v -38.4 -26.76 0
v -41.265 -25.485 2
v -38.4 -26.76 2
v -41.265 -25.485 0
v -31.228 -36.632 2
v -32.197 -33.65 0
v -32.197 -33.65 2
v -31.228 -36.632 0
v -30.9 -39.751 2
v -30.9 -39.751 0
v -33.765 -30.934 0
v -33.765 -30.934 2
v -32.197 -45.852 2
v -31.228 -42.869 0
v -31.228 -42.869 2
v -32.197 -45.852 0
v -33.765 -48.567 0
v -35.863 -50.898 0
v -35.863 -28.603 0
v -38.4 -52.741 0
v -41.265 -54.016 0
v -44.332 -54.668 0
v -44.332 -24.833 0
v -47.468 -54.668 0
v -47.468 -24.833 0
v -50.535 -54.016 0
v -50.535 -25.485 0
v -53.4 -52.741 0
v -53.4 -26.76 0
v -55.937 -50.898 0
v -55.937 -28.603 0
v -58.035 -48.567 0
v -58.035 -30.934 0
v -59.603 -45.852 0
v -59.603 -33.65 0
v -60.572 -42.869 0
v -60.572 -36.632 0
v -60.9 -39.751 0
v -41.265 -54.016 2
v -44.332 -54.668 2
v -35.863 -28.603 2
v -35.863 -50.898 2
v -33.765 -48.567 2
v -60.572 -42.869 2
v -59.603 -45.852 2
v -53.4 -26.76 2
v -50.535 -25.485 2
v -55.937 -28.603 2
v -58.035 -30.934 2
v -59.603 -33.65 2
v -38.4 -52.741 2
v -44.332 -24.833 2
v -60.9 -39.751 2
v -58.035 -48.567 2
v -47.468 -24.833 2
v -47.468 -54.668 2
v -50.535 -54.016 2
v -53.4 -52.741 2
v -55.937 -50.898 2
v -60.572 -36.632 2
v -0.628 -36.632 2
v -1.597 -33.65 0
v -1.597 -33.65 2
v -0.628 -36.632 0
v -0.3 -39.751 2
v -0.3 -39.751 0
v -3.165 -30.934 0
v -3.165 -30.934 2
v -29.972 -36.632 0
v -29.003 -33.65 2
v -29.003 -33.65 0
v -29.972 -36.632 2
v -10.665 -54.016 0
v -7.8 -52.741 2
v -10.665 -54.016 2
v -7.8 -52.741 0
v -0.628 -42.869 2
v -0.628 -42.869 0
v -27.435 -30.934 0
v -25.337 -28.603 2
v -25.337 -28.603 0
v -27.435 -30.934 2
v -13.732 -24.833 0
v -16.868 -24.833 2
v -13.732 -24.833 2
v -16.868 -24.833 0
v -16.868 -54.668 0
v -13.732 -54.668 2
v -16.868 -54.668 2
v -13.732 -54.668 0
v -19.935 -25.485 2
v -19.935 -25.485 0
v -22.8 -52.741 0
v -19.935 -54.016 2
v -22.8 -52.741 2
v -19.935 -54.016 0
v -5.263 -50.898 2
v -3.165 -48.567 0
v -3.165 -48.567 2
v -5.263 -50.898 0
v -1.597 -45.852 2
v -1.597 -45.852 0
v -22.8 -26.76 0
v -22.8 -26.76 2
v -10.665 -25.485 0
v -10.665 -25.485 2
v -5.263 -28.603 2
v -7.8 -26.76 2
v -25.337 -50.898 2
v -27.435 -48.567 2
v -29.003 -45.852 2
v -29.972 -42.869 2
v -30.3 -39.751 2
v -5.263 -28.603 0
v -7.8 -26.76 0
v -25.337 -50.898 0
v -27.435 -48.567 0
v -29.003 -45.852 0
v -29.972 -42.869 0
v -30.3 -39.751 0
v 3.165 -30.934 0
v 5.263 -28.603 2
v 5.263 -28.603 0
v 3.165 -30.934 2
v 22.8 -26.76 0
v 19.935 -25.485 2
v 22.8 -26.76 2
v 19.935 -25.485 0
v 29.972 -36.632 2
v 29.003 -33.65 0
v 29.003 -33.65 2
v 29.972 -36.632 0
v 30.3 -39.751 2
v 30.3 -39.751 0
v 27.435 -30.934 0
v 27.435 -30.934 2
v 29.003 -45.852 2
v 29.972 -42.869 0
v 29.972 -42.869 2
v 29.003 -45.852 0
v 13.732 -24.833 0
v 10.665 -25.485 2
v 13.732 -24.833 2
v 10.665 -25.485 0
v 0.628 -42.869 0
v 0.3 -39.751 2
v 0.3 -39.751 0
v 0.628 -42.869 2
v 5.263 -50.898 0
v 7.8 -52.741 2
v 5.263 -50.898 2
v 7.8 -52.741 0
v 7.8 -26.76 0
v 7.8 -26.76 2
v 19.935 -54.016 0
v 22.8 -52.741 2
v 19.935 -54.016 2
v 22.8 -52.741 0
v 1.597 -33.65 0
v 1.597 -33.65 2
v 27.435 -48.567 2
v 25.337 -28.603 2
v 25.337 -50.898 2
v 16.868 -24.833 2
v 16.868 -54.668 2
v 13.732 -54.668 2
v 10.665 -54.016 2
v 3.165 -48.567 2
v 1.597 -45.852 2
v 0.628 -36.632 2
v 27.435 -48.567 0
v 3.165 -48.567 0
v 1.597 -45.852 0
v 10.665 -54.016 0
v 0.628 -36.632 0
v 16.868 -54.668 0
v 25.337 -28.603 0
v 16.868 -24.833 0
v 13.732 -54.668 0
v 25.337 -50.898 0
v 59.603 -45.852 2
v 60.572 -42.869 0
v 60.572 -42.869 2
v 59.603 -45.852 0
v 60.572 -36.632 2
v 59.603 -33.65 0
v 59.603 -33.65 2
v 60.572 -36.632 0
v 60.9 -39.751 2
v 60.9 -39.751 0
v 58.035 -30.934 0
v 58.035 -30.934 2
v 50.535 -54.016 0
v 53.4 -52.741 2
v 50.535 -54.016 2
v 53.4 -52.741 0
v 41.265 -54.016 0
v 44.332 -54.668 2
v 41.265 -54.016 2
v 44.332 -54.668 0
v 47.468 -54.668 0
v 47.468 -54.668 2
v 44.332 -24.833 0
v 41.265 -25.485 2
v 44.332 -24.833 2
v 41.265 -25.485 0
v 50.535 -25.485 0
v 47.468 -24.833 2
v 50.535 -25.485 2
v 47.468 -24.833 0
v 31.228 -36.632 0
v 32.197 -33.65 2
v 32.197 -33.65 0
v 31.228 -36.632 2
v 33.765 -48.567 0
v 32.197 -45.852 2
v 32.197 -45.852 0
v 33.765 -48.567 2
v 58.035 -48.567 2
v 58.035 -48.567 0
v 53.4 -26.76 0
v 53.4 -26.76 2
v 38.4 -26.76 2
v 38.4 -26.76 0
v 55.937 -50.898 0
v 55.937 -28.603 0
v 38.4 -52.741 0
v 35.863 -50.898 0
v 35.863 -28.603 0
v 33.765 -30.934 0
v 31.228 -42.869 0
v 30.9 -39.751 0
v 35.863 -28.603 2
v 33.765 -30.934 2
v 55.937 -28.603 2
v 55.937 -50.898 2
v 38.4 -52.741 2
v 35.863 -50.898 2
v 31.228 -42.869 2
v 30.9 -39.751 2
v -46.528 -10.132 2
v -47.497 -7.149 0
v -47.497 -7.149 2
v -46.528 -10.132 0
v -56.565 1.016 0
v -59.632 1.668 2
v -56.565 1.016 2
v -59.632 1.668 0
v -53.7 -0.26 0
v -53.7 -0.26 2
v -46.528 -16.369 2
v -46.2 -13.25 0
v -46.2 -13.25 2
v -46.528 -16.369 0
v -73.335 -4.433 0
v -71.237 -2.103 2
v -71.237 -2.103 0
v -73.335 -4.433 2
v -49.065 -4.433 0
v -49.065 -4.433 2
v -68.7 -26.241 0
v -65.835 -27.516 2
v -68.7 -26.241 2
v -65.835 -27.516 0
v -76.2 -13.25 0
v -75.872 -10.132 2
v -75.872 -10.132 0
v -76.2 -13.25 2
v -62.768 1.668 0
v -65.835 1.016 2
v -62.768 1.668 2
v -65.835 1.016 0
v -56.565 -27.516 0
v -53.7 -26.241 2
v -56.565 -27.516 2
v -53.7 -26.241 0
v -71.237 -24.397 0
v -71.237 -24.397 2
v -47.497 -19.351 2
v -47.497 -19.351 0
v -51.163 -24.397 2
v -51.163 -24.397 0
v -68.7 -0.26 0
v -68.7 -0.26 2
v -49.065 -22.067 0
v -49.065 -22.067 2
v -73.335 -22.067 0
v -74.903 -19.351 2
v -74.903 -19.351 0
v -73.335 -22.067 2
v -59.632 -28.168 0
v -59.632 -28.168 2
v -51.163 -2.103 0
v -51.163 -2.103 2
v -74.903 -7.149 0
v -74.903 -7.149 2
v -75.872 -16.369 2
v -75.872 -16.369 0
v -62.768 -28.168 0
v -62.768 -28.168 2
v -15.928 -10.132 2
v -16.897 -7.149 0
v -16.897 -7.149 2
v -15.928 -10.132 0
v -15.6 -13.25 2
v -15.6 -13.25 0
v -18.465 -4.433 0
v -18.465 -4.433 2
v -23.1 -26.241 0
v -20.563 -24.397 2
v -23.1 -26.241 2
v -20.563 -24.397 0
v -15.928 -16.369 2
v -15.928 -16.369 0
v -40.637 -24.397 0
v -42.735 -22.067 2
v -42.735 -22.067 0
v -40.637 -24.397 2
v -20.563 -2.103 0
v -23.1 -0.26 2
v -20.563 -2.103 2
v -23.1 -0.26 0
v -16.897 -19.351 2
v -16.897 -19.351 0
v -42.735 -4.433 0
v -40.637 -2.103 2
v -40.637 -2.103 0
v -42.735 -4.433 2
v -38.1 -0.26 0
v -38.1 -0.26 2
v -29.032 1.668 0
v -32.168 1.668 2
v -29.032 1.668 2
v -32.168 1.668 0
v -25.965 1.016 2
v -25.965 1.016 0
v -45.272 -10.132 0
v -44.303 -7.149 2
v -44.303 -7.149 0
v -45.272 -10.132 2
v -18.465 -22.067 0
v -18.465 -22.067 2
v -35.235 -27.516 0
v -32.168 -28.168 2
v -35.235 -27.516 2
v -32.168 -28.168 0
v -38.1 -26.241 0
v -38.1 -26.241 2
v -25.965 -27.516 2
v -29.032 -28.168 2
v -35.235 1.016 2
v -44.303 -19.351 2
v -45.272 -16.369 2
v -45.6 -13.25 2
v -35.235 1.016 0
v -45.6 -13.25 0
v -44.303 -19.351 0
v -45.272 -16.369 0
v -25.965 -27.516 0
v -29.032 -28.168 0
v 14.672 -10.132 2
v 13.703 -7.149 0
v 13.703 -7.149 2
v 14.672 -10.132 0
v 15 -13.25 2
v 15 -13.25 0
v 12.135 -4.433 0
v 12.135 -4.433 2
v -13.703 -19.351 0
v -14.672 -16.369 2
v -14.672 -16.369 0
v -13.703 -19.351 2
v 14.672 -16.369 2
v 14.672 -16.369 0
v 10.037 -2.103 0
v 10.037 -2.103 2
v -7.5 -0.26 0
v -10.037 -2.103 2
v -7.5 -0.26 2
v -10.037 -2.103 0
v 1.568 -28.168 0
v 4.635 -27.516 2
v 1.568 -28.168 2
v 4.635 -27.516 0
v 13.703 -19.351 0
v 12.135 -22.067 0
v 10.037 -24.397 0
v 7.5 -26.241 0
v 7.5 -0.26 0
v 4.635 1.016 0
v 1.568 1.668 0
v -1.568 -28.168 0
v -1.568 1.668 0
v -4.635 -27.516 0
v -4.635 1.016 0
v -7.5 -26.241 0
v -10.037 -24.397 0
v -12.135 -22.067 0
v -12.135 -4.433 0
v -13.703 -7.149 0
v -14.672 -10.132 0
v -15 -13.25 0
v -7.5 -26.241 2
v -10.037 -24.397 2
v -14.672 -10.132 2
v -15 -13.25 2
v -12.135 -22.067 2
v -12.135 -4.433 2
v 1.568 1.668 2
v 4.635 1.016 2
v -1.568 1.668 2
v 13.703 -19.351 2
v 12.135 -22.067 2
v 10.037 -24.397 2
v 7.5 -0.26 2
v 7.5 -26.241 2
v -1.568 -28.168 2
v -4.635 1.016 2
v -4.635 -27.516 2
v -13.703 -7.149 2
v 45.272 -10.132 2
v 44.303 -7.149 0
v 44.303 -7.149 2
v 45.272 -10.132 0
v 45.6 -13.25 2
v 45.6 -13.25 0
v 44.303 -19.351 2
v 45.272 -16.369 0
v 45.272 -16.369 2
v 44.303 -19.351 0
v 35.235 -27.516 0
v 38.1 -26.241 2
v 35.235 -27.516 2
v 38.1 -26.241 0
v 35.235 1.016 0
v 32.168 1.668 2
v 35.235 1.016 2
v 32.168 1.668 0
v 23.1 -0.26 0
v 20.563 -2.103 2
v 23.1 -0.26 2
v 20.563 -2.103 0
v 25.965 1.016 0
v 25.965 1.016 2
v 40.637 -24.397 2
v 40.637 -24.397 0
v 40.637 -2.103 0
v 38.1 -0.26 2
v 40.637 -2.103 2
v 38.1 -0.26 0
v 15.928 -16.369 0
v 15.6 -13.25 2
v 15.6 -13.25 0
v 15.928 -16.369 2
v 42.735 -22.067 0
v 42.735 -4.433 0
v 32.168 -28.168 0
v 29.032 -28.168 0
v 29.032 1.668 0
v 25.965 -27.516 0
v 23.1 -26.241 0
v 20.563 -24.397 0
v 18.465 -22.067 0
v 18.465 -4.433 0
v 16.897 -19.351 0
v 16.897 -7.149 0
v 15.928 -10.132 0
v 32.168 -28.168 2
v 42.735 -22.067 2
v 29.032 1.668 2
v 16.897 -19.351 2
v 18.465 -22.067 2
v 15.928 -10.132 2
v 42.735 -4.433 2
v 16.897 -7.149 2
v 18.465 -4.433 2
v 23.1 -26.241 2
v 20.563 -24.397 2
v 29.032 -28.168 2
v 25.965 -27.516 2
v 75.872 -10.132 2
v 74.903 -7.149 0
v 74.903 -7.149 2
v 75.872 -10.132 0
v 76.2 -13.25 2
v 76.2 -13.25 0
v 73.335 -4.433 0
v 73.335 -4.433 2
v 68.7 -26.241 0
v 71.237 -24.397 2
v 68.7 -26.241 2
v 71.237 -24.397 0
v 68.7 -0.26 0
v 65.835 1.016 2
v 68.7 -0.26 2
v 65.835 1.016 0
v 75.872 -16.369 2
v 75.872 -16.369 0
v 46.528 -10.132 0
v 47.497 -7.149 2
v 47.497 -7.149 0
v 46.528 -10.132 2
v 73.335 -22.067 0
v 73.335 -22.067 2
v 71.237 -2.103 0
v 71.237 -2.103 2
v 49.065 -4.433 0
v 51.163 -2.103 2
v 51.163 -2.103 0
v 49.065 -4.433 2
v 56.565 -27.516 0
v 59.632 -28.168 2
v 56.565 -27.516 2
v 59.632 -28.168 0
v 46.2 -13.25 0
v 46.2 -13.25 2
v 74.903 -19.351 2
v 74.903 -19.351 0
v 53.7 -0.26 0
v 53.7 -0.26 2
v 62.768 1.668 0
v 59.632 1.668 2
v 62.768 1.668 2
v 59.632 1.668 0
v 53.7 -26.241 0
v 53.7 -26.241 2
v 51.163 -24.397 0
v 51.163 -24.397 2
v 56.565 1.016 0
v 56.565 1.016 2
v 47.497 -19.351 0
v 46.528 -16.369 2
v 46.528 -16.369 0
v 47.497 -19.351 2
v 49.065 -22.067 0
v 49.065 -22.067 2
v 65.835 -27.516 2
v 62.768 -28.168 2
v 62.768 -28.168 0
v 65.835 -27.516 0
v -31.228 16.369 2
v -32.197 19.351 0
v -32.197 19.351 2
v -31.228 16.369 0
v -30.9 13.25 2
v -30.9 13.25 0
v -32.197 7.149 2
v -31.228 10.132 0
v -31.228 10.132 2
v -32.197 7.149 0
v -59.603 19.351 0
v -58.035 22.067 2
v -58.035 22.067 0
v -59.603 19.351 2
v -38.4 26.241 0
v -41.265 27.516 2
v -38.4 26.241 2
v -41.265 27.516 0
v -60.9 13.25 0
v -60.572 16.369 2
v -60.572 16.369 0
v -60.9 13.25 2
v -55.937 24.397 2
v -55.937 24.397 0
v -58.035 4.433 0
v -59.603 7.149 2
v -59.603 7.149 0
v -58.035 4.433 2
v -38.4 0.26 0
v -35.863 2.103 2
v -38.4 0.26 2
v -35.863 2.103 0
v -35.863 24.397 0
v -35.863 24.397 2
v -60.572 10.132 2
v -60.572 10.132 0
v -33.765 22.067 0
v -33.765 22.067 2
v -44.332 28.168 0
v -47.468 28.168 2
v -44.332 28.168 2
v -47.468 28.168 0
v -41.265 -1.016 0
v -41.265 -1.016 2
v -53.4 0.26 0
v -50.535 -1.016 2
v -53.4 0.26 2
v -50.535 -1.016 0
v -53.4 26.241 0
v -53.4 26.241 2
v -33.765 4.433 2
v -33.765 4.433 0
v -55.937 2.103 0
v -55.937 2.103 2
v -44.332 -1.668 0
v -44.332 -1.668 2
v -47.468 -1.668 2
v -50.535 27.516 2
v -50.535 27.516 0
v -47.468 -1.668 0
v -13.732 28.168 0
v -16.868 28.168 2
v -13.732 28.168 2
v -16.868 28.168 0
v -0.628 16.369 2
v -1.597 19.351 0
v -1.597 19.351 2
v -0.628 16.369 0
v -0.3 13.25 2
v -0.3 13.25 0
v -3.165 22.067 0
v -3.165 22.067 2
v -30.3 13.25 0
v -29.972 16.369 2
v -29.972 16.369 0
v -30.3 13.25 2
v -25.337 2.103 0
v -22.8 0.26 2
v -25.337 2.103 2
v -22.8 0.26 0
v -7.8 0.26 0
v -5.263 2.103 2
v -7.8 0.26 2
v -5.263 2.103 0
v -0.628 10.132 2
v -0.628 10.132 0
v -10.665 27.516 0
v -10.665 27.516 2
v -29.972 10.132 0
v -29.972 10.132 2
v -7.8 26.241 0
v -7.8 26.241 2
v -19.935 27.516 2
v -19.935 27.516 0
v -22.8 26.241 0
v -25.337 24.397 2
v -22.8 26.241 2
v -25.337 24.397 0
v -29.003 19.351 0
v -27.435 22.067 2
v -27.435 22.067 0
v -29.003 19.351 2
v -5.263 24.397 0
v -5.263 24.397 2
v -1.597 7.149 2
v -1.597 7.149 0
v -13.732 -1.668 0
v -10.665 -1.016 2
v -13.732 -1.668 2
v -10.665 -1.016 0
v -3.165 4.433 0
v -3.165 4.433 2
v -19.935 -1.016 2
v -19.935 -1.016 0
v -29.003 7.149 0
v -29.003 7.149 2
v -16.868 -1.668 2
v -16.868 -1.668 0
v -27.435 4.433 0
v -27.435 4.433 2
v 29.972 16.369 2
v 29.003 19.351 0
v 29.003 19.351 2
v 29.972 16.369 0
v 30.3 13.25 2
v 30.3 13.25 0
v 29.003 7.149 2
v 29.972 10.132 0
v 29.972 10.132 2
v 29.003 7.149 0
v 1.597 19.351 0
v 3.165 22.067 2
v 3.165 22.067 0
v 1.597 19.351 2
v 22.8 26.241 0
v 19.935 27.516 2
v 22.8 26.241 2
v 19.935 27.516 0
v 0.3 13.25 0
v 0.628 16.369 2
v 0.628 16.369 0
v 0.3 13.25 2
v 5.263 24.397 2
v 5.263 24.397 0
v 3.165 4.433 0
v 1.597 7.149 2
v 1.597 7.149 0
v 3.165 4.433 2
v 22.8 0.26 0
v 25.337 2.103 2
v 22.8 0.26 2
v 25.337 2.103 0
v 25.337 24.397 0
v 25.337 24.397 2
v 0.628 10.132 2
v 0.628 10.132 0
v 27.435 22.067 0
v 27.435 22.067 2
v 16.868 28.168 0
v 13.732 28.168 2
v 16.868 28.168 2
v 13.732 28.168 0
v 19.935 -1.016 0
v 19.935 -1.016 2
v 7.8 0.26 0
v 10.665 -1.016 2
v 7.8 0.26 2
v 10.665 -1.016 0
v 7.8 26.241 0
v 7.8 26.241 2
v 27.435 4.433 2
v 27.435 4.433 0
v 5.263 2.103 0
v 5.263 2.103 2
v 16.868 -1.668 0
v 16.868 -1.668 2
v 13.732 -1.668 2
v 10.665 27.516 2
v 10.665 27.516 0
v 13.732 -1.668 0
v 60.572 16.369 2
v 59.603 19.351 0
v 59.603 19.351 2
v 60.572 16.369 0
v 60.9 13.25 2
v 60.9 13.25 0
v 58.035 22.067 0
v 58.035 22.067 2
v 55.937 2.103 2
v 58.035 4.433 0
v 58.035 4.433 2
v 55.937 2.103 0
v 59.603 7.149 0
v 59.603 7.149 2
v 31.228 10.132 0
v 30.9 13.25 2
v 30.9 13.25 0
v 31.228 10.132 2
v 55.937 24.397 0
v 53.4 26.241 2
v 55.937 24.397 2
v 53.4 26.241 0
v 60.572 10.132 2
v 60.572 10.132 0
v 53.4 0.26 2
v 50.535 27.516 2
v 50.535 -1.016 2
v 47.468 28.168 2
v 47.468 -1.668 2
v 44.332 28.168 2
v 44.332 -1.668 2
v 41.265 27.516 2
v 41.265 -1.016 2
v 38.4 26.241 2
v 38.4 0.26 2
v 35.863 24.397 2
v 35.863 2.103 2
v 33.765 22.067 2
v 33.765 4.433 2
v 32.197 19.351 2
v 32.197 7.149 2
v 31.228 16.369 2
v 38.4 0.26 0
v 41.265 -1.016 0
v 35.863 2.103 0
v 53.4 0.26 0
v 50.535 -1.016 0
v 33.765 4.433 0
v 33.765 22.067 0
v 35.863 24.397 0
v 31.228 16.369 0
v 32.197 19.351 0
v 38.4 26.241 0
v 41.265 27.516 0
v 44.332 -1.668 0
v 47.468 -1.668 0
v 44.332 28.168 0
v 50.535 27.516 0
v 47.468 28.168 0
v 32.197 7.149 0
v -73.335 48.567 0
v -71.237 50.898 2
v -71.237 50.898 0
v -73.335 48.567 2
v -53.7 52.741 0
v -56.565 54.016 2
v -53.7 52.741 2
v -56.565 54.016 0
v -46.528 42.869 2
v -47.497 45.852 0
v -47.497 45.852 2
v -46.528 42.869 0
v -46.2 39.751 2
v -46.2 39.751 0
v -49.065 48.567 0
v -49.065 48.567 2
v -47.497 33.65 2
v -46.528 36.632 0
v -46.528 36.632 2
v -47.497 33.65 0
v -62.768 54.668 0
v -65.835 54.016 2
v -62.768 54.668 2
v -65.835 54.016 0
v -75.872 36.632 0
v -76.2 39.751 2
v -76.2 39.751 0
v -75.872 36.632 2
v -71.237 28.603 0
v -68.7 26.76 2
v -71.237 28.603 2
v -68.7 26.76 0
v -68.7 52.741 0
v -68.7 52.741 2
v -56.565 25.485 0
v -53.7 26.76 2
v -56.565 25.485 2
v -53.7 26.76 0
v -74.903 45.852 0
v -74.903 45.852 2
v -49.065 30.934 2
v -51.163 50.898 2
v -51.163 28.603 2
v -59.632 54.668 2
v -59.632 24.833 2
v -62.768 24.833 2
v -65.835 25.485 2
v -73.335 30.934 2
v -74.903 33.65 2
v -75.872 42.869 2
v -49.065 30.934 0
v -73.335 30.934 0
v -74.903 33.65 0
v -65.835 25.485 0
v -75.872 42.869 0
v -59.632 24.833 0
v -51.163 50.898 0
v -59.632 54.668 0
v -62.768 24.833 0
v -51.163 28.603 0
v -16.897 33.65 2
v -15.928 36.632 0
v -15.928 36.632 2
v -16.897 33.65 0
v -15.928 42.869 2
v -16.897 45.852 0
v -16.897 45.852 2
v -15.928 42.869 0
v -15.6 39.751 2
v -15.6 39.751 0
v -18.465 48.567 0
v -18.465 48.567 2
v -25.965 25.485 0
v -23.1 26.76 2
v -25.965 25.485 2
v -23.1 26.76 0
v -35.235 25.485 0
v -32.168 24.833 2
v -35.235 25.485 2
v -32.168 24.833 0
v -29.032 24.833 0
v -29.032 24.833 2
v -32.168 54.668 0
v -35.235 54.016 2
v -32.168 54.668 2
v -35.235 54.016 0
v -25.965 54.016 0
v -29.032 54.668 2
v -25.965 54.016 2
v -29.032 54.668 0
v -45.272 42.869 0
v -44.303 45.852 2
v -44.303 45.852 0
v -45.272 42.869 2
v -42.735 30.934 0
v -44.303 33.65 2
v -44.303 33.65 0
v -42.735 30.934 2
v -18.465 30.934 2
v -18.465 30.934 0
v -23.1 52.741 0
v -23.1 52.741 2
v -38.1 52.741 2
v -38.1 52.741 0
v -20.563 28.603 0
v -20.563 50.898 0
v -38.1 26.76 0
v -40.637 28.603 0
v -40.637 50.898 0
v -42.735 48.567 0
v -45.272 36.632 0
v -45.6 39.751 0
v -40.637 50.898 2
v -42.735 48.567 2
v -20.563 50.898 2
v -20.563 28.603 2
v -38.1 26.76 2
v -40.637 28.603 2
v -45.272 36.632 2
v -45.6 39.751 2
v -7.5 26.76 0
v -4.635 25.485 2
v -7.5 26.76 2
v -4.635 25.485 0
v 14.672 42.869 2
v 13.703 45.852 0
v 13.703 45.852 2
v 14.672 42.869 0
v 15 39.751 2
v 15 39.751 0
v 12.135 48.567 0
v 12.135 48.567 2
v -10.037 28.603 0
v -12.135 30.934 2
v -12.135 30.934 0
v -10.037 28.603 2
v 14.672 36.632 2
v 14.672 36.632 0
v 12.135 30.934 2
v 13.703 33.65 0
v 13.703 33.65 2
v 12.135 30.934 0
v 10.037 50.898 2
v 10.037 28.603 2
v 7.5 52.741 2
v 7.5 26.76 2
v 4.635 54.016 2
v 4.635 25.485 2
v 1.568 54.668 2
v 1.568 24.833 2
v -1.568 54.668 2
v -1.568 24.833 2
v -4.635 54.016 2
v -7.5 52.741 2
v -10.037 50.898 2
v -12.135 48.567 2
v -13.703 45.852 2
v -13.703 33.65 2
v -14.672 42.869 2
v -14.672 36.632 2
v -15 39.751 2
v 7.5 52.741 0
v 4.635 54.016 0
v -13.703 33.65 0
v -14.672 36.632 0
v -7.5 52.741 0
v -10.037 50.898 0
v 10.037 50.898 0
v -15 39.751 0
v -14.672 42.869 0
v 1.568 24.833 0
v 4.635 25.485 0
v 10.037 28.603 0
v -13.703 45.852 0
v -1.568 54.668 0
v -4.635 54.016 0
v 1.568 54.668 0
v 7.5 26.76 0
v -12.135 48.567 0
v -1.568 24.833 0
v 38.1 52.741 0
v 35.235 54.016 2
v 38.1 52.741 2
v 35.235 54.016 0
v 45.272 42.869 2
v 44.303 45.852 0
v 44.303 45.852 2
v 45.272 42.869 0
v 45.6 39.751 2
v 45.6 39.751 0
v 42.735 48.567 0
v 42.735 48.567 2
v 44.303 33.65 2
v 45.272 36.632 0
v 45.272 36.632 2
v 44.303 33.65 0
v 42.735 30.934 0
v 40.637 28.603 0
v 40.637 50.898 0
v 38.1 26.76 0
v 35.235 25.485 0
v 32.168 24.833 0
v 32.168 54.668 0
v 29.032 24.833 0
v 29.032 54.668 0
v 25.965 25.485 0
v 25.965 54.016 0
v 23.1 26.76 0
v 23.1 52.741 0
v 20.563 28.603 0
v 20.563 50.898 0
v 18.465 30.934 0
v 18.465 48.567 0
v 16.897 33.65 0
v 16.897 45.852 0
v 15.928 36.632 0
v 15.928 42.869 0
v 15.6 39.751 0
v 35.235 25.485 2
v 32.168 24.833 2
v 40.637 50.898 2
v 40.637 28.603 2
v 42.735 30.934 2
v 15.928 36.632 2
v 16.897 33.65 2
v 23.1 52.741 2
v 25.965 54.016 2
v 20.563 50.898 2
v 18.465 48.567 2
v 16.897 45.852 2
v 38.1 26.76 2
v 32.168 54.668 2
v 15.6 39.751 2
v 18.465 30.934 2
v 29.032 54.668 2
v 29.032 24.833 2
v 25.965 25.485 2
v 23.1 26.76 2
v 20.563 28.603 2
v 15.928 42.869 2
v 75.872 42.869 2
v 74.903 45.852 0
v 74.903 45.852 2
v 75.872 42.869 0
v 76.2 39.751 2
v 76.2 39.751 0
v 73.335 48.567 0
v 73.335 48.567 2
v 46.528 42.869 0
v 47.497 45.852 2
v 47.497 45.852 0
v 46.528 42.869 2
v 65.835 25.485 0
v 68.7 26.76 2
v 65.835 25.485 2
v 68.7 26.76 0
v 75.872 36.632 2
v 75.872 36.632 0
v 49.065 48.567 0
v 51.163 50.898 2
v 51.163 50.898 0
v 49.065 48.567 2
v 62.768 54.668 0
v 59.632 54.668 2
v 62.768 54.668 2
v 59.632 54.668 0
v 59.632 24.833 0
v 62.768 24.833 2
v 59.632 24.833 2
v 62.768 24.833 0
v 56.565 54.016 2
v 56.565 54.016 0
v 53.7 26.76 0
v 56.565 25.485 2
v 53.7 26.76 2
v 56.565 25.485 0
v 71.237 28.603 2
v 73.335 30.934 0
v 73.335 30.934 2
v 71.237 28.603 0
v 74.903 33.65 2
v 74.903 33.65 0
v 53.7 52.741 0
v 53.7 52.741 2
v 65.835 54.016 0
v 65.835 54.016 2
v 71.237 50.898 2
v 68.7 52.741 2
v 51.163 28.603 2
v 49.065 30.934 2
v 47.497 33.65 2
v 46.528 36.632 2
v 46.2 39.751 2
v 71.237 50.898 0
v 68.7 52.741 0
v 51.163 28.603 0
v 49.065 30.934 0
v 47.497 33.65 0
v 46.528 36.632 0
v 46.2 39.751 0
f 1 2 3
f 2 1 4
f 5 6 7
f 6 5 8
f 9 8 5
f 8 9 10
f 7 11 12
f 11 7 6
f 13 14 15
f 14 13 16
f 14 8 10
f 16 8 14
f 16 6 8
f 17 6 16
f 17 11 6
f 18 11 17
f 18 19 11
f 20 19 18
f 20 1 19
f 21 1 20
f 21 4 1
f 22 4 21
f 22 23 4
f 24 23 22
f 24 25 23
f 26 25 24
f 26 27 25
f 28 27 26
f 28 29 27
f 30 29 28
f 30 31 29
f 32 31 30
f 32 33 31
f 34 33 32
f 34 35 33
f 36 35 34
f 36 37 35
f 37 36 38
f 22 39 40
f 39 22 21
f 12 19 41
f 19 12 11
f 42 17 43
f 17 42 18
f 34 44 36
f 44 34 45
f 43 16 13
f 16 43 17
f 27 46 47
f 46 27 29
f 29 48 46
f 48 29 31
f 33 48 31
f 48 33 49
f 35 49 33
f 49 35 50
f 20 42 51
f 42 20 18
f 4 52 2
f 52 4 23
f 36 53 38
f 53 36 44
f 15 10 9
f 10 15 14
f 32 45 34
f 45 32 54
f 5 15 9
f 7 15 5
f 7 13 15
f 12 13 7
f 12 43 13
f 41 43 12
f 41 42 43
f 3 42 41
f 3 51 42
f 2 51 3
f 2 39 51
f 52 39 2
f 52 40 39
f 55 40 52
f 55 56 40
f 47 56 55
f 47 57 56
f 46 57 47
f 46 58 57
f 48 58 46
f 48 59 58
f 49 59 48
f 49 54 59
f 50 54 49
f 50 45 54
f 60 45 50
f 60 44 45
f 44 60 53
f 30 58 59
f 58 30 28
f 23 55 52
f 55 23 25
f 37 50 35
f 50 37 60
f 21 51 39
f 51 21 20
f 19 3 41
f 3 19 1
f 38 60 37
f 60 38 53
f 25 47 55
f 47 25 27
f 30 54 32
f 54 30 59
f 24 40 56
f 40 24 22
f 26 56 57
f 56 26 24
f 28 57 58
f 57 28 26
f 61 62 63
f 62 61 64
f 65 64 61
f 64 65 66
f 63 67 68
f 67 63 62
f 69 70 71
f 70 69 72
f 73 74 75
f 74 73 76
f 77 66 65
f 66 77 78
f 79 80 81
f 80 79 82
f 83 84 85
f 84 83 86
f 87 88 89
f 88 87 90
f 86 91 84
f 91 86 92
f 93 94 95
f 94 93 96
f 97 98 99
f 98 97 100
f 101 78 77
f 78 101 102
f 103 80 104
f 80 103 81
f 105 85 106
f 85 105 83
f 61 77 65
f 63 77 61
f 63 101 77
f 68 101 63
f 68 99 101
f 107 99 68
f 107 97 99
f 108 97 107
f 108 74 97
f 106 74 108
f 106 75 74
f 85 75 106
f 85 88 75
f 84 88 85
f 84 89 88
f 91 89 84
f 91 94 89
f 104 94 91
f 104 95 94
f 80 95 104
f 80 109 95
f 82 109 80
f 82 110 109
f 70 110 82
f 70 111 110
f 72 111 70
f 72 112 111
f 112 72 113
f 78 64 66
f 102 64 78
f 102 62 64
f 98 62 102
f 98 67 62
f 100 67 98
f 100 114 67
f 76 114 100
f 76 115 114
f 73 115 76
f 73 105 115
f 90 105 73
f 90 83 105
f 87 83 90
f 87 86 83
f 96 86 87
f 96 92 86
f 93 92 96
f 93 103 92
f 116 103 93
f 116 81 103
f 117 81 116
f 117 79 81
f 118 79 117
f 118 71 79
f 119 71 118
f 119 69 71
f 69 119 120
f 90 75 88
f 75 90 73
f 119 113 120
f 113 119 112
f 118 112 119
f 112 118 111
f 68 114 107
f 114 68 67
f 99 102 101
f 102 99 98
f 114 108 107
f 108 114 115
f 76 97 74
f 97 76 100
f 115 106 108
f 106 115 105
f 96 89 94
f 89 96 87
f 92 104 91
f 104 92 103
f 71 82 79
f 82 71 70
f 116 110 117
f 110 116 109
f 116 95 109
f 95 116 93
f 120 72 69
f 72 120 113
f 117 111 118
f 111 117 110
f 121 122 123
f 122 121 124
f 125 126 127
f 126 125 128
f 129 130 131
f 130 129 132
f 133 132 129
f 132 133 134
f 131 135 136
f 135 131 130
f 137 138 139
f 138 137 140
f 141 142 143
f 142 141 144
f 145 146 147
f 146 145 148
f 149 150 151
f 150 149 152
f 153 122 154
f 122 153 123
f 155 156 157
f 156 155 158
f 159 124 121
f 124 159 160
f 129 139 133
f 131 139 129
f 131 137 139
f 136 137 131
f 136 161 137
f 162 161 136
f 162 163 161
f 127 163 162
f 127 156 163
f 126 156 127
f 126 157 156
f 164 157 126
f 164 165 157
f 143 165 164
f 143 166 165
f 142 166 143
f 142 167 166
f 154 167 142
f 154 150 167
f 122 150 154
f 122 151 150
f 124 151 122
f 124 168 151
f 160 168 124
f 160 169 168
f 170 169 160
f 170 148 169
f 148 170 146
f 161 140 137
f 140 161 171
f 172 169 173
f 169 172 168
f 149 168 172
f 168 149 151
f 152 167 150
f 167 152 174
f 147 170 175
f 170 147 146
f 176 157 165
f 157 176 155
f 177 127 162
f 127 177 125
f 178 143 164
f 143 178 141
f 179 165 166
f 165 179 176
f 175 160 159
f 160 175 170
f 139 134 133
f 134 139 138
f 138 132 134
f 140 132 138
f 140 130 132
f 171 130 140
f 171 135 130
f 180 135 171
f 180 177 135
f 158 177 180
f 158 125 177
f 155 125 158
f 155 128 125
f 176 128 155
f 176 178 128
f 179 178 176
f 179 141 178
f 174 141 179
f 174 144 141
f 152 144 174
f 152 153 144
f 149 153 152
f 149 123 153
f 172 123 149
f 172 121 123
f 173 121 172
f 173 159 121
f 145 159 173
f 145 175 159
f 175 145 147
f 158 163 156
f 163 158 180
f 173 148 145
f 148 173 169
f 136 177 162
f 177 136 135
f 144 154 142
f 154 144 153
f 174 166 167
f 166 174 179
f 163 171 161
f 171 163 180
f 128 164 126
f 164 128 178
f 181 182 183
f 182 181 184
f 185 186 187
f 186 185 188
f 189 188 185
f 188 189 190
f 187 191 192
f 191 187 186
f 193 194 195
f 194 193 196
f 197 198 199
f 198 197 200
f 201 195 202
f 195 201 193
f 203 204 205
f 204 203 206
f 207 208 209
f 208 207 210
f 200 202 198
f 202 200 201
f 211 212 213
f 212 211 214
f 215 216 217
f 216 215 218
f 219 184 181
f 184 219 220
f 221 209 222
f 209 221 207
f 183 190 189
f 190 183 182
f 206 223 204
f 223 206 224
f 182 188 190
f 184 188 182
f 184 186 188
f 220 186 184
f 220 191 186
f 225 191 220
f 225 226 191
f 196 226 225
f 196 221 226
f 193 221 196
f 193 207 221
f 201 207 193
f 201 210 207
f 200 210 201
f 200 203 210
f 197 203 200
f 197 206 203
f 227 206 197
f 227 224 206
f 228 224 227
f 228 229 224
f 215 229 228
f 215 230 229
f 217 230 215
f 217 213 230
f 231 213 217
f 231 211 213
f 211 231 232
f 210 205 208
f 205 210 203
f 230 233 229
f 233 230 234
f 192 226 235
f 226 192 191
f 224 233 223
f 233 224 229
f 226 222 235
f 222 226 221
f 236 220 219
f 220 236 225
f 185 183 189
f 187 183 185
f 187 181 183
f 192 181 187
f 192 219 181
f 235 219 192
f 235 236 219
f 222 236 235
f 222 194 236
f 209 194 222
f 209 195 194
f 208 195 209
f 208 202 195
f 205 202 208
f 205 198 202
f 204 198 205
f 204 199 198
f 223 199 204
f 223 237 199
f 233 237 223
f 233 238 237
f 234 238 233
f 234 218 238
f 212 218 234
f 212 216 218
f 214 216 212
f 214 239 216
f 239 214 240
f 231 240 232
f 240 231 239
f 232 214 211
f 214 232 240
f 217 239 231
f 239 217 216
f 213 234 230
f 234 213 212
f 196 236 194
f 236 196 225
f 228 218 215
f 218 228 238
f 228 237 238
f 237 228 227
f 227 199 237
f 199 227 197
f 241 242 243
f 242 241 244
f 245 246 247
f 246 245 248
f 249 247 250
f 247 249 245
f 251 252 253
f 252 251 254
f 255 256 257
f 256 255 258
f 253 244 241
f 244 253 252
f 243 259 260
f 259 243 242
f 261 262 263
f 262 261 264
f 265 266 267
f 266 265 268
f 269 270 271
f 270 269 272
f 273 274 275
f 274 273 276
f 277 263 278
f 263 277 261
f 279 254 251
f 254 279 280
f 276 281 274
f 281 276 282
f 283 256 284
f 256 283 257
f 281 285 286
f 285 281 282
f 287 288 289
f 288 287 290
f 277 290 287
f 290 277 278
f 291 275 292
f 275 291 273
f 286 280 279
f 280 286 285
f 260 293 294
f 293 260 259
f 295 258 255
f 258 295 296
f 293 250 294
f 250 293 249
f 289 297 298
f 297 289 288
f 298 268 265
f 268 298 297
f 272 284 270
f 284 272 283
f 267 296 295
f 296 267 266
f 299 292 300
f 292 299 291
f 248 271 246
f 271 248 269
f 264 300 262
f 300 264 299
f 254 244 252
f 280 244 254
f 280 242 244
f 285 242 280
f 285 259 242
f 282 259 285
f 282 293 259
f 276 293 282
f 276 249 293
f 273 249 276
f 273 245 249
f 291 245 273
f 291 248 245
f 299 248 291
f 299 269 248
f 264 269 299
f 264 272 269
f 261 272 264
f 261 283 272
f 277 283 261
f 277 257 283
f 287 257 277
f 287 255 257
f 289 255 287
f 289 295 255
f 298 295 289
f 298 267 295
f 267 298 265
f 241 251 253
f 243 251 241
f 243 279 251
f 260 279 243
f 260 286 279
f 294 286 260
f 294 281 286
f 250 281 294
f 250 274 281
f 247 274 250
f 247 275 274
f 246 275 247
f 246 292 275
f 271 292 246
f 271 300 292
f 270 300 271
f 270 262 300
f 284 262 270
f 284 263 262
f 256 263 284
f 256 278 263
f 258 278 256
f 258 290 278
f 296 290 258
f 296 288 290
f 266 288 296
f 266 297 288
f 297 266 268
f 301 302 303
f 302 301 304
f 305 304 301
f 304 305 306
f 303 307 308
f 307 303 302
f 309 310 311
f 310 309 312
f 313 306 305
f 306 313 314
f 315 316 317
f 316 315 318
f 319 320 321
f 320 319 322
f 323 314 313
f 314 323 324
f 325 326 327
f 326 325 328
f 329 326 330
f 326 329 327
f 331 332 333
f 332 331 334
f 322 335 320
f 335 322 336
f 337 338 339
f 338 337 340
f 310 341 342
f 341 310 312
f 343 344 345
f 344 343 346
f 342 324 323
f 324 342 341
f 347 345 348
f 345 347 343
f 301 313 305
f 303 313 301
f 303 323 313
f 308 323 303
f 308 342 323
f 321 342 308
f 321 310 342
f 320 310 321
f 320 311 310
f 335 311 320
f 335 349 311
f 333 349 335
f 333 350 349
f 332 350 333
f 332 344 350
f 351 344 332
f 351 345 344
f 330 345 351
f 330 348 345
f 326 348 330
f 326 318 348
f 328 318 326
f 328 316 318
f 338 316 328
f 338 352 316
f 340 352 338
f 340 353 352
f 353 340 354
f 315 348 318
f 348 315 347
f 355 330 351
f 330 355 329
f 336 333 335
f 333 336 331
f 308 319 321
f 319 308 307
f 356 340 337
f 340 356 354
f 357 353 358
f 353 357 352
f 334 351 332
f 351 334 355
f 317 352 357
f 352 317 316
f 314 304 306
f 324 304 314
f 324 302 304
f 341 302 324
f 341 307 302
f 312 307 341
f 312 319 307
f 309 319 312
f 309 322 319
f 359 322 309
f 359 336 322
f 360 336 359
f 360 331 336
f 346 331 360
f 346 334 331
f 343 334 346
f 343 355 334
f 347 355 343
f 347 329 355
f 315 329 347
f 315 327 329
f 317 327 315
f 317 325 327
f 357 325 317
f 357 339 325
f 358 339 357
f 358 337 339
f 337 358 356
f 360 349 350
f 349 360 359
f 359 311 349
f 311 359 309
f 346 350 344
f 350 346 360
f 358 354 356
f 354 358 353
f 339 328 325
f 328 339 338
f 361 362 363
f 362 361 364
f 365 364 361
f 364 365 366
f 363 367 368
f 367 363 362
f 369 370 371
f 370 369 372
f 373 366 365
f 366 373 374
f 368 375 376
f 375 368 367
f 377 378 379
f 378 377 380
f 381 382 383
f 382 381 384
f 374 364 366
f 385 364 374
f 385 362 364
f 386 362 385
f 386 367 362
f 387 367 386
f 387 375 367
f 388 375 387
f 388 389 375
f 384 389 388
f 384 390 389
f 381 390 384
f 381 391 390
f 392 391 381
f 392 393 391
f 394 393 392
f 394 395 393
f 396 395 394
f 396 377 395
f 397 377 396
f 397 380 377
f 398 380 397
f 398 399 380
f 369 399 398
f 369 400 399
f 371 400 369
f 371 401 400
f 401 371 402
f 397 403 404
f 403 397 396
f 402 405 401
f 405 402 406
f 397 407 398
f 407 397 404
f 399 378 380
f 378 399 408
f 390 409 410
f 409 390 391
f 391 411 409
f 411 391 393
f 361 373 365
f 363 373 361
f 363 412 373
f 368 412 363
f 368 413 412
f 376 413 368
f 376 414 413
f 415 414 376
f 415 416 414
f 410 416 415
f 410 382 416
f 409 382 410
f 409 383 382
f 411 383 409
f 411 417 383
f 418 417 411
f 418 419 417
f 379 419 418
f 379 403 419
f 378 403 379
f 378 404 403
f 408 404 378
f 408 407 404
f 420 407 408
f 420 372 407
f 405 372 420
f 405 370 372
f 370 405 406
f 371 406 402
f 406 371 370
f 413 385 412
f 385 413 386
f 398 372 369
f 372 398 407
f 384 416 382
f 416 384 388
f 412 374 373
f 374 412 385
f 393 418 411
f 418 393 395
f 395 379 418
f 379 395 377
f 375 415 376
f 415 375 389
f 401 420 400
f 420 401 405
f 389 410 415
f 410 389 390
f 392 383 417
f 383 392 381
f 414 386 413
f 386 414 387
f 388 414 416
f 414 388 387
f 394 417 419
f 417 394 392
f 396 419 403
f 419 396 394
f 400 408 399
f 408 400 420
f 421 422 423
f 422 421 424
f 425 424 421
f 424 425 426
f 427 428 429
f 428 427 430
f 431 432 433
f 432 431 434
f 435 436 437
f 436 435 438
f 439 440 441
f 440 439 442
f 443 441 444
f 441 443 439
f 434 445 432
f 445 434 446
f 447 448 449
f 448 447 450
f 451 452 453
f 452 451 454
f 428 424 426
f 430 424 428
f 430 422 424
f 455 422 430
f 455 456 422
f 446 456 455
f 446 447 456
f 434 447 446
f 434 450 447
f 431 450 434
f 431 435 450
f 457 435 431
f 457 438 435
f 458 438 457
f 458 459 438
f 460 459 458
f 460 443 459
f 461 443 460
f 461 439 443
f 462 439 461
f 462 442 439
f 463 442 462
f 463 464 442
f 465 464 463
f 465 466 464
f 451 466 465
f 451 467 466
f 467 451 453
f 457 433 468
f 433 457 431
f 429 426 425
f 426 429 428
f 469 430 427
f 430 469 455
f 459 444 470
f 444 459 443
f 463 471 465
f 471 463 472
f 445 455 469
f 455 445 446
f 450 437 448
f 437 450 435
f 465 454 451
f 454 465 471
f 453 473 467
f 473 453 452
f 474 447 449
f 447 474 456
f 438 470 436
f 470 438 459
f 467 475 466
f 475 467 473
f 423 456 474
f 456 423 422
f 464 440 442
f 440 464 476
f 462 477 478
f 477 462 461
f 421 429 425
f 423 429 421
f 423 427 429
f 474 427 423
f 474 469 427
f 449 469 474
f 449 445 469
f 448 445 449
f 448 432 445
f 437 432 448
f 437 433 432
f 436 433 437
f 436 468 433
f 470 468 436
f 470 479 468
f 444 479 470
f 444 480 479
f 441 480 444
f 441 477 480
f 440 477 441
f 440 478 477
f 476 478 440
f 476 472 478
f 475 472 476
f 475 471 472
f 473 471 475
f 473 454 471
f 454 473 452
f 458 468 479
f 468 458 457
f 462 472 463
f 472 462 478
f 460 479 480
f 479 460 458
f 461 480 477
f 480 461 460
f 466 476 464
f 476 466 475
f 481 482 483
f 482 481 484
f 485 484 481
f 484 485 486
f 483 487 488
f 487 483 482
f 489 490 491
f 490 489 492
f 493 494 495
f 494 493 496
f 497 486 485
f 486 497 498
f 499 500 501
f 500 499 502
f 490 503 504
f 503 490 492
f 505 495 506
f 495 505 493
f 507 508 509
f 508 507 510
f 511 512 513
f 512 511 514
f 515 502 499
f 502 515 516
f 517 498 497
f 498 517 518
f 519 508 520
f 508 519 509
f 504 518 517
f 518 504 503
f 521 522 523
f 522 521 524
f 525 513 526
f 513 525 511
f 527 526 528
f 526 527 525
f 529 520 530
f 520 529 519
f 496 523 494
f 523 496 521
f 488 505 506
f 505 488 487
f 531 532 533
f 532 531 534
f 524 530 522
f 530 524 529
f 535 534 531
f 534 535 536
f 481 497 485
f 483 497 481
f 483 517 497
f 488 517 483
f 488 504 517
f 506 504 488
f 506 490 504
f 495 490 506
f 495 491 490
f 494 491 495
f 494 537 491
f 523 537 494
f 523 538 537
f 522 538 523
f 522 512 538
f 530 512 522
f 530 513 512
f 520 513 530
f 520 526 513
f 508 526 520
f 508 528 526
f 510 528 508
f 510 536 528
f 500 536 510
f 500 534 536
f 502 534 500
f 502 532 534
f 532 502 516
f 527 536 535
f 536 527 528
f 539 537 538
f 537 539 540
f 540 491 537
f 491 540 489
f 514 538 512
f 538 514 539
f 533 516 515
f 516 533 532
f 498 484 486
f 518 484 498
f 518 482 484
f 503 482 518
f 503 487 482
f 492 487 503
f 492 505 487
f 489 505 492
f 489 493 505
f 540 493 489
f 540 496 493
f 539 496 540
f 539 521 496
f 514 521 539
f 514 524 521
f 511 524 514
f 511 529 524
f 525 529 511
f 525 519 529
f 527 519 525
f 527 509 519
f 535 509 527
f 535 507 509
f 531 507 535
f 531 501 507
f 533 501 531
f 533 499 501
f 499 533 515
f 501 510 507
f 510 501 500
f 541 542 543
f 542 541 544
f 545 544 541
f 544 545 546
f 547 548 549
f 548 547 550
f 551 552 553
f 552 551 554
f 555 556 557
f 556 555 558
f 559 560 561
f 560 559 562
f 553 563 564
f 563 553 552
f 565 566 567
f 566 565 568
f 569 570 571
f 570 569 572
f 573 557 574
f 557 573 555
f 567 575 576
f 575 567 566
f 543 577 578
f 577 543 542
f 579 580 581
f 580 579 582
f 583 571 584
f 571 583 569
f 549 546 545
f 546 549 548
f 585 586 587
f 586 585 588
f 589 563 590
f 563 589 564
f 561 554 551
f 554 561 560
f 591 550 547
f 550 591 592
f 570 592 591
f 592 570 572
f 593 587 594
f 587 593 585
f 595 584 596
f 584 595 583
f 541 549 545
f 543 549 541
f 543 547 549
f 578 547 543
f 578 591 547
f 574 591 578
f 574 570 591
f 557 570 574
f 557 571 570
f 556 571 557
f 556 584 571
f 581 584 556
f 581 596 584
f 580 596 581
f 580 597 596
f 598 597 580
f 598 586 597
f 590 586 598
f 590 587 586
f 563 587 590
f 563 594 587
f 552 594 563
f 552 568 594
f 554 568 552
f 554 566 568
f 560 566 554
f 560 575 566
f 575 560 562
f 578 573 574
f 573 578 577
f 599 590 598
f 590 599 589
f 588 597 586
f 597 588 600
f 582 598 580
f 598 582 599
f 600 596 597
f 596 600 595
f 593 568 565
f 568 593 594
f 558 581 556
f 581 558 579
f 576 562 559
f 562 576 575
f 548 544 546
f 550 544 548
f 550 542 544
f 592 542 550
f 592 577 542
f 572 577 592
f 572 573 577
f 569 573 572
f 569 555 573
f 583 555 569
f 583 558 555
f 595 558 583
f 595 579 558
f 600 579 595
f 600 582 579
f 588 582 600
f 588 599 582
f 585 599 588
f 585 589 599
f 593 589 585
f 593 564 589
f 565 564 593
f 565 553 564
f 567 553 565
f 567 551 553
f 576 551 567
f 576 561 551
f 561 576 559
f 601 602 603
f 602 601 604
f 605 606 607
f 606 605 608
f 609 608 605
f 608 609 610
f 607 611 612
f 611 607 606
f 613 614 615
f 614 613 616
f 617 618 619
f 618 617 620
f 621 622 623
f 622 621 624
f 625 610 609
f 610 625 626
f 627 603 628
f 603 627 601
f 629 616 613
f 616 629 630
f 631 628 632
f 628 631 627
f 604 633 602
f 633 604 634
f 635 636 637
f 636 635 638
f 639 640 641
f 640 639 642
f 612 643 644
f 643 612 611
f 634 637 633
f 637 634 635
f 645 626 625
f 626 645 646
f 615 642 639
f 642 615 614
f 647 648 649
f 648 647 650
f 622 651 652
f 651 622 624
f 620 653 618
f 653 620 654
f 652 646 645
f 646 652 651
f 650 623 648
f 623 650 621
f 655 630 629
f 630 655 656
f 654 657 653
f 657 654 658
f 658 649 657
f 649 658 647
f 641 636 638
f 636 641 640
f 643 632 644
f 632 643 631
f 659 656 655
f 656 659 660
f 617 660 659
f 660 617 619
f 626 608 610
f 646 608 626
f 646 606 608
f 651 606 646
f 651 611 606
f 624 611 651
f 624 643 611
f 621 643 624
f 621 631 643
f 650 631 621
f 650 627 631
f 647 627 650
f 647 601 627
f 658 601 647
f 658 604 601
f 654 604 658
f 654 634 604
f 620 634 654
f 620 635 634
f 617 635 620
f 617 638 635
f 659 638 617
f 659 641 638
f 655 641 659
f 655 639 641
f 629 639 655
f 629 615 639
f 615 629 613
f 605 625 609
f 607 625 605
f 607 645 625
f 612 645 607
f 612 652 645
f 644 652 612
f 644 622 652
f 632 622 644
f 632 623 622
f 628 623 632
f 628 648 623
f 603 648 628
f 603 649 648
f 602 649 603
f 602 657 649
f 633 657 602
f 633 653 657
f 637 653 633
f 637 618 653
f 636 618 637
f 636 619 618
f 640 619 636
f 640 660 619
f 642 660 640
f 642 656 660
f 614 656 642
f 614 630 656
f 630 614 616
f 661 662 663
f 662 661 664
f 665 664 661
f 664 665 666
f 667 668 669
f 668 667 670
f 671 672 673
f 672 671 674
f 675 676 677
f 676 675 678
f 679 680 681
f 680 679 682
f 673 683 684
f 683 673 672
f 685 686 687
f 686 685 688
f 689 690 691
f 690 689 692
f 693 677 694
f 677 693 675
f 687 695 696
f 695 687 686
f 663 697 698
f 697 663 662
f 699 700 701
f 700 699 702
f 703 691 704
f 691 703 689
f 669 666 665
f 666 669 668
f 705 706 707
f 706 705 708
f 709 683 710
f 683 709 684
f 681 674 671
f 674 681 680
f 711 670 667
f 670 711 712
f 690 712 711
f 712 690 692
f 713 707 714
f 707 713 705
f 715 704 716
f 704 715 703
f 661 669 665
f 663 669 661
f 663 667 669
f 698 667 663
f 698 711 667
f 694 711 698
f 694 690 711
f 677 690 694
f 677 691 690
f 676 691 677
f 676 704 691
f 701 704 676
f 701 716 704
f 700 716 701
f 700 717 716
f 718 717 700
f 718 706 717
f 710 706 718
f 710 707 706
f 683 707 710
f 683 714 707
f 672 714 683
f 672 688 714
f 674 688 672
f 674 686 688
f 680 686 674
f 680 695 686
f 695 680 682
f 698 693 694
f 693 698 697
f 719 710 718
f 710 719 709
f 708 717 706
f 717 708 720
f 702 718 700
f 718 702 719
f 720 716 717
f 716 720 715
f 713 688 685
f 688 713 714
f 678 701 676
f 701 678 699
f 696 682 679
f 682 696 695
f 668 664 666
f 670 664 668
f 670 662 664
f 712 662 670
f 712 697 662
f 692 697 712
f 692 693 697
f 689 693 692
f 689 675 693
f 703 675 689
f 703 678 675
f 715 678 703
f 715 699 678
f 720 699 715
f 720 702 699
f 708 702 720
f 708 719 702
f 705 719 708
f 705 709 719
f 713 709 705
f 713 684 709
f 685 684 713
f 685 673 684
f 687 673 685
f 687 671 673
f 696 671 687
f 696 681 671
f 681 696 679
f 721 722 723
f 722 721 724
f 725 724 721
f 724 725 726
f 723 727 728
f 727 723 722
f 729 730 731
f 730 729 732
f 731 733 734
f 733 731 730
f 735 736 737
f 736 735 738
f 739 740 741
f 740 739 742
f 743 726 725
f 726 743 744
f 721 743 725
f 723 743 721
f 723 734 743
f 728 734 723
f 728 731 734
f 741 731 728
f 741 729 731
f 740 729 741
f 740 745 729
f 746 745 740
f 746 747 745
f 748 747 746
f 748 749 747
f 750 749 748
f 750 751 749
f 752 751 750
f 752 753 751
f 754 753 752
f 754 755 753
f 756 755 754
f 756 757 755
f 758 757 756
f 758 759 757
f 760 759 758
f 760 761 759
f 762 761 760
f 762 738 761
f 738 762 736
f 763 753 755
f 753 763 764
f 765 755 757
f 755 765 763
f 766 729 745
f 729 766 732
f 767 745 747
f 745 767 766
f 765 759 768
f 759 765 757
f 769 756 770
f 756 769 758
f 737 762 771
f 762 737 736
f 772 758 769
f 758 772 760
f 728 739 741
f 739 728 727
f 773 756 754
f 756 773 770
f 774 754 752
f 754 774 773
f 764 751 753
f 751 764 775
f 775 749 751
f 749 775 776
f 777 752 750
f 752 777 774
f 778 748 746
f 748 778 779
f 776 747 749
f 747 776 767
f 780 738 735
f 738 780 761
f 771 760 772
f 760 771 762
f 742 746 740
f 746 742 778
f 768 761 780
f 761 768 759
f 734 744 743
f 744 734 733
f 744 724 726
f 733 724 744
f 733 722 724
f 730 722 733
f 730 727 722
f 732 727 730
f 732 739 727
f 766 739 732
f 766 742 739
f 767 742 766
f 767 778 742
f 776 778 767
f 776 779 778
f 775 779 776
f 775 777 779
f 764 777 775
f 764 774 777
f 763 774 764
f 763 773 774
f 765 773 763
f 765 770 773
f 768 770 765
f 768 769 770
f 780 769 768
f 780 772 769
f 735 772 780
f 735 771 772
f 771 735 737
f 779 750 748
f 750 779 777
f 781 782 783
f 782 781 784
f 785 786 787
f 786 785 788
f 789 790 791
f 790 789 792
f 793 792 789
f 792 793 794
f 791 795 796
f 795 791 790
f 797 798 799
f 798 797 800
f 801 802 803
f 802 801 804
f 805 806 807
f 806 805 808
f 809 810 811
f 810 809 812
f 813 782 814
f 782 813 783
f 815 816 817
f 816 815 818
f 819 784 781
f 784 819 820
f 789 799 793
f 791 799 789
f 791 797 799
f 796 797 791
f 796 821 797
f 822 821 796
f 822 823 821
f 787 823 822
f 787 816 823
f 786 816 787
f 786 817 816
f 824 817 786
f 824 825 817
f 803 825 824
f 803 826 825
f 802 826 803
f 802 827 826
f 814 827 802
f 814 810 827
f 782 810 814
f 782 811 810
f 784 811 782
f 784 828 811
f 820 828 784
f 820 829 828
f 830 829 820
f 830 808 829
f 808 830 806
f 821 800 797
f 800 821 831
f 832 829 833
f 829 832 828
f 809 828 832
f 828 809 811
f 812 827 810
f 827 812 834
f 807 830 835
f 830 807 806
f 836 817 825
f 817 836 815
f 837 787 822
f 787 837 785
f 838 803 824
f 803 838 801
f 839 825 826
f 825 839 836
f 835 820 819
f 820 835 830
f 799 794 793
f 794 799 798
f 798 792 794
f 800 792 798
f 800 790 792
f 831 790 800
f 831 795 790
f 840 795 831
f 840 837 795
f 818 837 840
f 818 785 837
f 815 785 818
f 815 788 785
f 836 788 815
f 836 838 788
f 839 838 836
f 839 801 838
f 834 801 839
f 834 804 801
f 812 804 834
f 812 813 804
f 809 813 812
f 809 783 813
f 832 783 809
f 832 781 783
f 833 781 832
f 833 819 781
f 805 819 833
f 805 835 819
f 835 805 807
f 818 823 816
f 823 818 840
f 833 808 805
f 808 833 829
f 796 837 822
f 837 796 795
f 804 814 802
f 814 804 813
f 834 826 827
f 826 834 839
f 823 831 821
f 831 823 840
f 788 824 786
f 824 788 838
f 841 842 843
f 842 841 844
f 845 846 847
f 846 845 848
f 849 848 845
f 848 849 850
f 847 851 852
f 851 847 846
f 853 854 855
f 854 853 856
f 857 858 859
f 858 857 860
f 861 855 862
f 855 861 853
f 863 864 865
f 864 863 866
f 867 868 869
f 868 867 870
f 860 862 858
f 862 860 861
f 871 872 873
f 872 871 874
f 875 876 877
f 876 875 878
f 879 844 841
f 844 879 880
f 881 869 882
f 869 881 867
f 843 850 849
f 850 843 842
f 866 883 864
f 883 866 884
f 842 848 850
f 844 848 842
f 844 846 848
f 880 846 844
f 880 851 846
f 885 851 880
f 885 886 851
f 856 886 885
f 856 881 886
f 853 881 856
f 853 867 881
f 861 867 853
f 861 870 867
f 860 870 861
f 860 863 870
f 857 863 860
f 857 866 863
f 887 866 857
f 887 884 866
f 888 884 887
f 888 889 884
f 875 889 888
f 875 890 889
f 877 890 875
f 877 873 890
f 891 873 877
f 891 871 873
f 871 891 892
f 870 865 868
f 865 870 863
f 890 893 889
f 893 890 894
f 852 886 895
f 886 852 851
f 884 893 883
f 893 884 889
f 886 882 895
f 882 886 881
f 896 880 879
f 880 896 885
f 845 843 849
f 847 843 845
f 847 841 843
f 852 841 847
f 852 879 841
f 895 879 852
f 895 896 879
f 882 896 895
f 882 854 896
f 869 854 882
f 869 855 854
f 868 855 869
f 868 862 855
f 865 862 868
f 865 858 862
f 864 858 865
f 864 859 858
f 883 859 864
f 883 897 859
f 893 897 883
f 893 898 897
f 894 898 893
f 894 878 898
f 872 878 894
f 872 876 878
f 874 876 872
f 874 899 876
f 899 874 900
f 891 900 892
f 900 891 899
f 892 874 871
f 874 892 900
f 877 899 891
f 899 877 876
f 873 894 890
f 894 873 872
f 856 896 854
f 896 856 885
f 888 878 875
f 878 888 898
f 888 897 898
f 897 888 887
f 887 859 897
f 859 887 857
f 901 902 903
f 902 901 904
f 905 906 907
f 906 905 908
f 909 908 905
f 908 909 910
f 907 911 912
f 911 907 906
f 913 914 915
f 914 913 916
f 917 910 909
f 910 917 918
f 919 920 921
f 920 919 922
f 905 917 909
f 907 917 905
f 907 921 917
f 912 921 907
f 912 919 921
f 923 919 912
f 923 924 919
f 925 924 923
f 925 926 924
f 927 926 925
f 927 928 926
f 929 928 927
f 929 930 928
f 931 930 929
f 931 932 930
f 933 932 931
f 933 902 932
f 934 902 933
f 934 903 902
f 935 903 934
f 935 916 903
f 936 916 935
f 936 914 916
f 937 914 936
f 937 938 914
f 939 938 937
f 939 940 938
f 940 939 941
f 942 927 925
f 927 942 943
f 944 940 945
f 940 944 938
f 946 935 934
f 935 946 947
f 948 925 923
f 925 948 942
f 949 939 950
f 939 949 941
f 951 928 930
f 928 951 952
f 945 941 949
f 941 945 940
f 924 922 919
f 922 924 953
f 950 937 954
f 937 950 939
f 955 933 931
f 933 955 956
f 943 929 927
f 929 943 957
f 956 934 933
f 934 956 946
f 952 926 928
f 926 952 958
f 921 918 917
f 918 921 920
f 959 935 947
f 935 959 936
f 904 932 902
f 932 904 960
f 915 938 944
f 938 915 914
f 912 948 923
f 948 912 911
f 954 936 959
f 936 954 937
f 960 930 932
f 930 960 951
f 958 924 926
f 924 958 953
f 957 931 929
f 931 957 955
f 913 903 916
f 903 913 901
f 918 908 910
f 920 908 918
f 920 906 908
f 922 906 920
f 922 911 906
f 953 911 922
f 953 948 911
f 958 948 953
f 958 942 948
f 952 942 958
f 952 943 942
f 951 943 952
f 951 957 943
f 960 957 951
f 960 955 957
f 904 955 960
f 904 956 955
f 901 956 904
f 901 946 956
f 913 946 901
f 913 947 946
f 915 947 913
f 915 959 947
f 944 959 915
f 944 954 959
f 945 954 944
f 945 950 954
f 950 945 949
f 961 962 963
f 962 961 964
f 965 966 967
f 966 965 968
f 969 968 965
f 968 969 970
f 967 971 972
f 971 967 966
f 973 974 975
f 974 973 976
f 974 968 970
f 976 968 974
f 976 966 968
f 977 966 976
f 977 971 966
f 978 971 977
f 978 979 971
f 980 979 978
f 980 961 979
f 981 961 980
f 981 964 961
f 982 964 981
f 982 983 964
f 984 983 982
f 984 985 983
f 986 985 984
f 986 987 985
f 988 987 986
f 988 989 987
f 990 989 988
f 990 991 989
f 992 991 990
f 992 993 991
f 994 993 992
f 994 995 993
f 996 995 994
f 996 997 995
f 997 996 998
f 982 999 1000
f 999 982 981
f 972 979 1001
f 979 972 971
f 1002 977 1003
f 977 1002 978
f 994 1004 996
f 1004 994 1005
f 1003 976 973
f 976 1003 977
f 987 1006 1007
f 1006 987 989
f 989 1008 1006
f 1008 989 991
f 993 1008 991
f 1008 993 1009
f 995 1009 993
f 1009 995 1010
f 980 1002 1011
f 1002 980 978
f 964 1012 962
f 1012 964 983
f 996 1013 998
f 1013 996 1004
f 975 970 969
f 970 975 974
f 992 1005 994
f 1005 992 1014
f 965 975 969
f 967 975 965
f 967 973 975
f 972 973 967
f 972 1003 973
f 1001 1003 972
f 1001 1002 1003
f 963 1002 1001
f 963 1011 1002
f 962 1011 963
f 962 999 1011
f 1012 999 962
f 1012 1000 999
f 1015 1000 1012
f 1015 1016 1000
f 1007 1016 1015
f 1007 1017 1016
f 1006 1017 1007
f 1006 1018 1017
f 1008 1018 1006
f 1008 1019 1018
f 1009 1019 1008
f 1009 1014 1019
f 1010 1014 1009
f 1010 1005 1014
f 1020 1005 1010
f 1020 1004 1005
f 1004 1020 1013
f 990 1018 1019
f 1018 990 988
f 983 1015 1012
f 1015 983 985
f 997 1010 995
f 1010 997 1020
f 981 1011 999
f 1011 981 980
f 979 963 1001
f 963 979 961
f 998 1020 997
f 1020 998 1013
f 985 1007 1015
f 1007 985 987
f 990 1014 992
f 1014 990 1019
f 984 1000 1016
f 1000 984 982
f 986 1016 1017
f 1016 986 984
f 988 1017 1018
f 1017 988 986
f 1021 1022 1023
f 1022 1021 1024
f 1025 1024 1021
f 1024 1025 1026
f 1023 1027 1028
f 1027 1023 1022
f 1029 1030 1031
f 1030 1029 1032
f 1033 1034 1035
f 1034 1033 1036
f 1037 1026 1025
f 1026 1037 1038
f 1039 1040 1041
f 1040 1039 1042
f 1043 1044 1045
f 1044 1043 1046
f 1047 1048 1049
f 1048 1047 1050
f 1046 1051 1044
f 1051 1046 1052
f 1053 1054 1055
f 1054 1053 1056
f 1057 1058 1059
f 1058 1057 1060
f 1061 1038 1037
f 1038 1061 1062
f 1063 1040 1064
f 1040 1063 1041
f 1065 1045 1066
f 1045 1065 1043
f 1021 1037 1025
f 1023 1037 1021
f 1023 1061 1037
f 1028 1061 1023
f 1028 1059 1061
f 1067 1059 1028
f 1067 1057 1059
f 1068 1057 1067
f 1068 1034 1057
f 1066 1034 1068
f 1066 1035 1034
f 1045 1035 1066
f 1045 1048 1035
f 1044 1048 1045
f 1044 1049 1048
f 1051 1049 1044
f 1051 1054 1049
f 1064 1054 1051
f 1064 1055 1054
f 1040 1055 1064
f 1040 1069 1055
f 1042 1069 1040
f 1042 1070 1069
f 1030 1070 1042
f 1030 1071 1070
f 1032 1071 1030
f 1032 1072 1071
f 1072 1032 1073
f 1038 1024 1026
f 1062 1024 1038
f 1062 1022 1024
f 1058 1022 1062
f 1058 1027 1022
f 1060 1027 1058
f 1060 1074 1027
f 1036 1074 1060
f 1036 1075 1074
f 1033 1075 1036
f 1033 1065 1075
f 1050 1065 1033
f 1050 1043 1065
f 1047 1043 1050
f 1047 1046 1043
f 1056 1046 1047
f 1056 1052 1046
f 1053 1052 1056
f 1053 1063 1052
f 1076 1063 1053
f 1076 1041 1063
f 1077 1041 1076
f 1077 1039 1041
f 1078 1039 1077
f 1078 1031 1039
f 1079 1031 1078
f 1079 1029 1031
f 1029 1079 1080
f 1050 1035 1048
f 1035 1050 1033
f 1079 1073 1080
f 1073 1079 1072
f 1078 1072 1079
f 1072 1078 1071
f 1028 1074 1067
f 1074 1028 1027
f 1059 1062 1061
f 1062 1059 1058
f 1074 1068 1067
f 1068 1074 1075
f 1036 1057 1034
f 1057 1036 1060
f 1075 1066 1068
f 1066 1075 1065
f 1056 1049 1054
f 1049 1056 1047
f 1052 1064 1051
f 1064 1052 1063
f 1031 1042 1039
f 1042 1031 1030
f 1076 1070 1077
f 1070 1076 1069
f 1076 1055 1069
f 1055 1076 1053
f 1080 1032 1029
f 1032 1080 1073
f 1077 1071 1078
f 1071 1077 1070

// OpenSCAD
/* [Piece Dimensions] */
//of piece (mm)
Height = 2; //[1:10]
//of piece (mm)
Diameter = 30; //[5:50]
radius = Diameter/2;
extra = 1.02; //[0.96, 0.97, 0.98, 0.99, 1.00, 1.01, 1.02, 1.03, 1.04, 1.05]
interRowDistance = sin(60) * extra;

/* [Grid Size] */
Rows = 4; //[1:20]
oddRows = ( Rows % 2 );
rowStart = -1 * ceil ( ( Rows - oddRows ) / 2 ) + ( 1 - oddRows);
rowEnd   =      floor( ( Rows - oddRows ) / 2 );

Cols = 5; //[1:20]
oddCols = ( Cols % 2 );
colStart = -1 * ceil ( ( Cols - oddCols ) / 2 ) + ( 1 - oddCols);
colEnd   =      floor( ( Cols - oddCols ) / 2 );

colSpace = extra * Diameter;
rowSpace = colSpace  * sin(60);

main();

module main() {
	xExtent = Diameter + ( Cols - 1 ) * colSpace;
    yExtent = Diameter + ( Rows - 1 ) * rowSpace;
    echo("Extent of grid: Y: ", yExtent, " X: ", xExtent);
	union() {
		for ( row = [ rowStart : rowEnd ] ) {
			for ( col = [ colStart : ( colEnd - abs(row % 2) ) ] ) {
				translate(v=[ ( col + ( abs(row % 2) - ( 1 - oddCols ) ) / 2 ) * colSpace,
                               ( row                  - ( 1 - oddRows )   / 2 ) * rowSpace,
                               0 ]
				)
				{
					cylinder(h = Height, r = radius);
				}
			}
		}
	}
}
  
